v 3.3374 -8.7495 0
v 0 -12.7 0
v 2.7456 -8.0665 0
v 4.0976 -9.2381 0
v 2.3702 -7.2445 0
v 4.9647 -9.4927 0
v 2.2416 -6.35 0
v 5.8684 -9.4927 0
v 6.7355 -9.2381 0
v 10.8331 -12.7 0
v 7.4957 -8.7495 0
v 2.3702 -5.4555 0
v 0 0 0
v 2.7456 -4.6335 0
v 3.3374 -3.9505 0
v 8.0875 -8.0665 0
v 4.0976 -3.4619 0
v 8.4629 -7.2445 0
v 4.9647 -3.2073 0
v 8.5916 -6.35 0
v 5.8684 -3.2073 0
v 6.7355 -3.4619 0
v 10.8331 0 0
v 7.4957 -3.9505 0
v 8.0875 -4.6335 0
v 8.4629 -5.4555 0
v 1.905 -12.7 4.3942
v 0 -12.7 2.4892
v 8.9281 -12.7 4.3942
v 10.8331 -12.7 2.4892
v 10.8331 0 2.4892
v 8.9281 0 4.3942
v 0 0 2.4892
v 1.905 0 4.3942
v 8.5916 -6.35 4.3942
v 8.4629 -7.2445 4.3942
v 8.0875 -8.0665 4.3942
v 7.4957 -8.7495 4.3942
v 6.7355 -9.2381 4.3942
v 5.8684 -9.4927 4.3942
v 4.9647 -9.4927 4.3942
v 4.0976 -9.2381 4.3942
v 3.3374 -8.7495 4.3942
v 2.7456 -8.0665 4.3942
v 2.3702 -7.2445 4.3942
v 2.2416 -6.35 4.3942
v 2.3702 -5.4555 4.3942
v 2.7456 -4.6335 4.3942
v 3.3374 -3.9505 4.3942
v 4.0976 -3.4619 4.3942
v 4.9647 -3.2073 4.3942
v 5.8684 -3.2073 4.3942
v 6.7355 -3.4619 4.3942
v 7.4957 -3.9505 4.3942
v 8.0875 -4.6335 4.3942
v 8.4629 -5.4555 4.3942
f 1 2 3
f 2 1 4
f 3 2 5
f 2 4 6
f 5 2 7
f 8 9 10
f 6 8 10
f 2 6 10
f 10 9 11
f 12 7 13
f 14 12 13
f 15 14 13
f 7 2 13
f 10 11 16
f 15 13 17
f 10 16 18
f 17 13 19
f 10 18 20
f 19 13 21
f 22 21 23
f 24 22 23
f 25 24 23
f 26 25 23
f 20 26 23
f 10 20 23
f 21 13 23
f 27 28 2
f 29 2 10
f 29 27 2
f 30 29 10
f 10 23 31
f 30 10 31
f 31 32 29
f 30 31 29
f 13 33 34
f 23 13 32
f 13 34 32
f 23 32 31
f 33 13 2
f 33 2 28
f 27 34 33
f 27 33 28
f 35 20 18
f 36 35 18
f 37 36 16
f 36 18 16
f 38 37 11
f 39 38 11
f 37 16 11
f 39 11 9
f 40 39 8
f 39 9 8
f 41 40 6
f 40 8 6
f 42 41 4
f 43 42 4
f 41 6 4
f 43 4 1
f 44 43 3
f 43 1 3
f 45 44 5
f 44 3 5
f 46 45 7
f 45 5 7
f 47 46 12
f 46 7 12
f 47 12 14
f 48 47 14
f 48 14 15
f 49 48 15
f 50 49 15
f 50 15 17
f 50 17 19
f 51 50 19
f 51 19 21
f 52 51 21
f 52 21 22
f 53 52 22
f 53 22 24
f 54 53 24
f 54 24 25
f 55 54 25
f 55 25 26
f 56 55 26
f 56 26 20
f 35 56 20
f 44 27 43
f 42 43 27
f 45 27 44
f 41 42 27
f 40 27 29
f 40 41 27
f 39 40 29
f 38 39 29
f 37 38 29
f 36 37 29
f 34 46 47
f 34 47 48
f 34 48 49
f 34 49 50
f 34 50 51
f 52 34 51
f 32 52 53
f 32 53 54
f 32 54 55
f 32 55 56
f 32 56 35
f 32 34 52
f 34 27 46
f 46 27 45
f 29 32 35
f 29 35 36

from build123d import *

# Parameters (mm, degrees)
F0_W     = 10.8331
F0_H     = 4.3942
F1_DEPTH = 12.7
F2_SIZE  = 1.905
F3_R     = 3.175
F4_DEPTH = 25.4


with BuildPart() as f1:
    # F0 (on Front) → F1 (new body)
    with BuildSketch(Plane.XZ):
        with Locations((5.41655, 2.1971)):
            Rectangle(F0_W, F0_H)
    extrude(amount=F1_DEPTH)

    # F2
    f2_edges = [f1.edges().sort_by_distance(p)[0] for p in [
        (10.8331, -6.35, 4.3942),
        (0, -6.35, 4.3942),
    ]]
    chamfer(f2_edges, length=F2_SIZE)

    # F3 (on face) → F4 (cut)
    with BuildSketch(Plane(origin=(0, 0, 0), x_dir=(1, 0, 0), z_dir=(0, 0, -1))):
        with Locations((5.41655, 6.35)):
            Circle(F3_R)
    extrude(amount=-F4_DEPTH, mode=Mode.SUBTRACT)


solid = f1.part
